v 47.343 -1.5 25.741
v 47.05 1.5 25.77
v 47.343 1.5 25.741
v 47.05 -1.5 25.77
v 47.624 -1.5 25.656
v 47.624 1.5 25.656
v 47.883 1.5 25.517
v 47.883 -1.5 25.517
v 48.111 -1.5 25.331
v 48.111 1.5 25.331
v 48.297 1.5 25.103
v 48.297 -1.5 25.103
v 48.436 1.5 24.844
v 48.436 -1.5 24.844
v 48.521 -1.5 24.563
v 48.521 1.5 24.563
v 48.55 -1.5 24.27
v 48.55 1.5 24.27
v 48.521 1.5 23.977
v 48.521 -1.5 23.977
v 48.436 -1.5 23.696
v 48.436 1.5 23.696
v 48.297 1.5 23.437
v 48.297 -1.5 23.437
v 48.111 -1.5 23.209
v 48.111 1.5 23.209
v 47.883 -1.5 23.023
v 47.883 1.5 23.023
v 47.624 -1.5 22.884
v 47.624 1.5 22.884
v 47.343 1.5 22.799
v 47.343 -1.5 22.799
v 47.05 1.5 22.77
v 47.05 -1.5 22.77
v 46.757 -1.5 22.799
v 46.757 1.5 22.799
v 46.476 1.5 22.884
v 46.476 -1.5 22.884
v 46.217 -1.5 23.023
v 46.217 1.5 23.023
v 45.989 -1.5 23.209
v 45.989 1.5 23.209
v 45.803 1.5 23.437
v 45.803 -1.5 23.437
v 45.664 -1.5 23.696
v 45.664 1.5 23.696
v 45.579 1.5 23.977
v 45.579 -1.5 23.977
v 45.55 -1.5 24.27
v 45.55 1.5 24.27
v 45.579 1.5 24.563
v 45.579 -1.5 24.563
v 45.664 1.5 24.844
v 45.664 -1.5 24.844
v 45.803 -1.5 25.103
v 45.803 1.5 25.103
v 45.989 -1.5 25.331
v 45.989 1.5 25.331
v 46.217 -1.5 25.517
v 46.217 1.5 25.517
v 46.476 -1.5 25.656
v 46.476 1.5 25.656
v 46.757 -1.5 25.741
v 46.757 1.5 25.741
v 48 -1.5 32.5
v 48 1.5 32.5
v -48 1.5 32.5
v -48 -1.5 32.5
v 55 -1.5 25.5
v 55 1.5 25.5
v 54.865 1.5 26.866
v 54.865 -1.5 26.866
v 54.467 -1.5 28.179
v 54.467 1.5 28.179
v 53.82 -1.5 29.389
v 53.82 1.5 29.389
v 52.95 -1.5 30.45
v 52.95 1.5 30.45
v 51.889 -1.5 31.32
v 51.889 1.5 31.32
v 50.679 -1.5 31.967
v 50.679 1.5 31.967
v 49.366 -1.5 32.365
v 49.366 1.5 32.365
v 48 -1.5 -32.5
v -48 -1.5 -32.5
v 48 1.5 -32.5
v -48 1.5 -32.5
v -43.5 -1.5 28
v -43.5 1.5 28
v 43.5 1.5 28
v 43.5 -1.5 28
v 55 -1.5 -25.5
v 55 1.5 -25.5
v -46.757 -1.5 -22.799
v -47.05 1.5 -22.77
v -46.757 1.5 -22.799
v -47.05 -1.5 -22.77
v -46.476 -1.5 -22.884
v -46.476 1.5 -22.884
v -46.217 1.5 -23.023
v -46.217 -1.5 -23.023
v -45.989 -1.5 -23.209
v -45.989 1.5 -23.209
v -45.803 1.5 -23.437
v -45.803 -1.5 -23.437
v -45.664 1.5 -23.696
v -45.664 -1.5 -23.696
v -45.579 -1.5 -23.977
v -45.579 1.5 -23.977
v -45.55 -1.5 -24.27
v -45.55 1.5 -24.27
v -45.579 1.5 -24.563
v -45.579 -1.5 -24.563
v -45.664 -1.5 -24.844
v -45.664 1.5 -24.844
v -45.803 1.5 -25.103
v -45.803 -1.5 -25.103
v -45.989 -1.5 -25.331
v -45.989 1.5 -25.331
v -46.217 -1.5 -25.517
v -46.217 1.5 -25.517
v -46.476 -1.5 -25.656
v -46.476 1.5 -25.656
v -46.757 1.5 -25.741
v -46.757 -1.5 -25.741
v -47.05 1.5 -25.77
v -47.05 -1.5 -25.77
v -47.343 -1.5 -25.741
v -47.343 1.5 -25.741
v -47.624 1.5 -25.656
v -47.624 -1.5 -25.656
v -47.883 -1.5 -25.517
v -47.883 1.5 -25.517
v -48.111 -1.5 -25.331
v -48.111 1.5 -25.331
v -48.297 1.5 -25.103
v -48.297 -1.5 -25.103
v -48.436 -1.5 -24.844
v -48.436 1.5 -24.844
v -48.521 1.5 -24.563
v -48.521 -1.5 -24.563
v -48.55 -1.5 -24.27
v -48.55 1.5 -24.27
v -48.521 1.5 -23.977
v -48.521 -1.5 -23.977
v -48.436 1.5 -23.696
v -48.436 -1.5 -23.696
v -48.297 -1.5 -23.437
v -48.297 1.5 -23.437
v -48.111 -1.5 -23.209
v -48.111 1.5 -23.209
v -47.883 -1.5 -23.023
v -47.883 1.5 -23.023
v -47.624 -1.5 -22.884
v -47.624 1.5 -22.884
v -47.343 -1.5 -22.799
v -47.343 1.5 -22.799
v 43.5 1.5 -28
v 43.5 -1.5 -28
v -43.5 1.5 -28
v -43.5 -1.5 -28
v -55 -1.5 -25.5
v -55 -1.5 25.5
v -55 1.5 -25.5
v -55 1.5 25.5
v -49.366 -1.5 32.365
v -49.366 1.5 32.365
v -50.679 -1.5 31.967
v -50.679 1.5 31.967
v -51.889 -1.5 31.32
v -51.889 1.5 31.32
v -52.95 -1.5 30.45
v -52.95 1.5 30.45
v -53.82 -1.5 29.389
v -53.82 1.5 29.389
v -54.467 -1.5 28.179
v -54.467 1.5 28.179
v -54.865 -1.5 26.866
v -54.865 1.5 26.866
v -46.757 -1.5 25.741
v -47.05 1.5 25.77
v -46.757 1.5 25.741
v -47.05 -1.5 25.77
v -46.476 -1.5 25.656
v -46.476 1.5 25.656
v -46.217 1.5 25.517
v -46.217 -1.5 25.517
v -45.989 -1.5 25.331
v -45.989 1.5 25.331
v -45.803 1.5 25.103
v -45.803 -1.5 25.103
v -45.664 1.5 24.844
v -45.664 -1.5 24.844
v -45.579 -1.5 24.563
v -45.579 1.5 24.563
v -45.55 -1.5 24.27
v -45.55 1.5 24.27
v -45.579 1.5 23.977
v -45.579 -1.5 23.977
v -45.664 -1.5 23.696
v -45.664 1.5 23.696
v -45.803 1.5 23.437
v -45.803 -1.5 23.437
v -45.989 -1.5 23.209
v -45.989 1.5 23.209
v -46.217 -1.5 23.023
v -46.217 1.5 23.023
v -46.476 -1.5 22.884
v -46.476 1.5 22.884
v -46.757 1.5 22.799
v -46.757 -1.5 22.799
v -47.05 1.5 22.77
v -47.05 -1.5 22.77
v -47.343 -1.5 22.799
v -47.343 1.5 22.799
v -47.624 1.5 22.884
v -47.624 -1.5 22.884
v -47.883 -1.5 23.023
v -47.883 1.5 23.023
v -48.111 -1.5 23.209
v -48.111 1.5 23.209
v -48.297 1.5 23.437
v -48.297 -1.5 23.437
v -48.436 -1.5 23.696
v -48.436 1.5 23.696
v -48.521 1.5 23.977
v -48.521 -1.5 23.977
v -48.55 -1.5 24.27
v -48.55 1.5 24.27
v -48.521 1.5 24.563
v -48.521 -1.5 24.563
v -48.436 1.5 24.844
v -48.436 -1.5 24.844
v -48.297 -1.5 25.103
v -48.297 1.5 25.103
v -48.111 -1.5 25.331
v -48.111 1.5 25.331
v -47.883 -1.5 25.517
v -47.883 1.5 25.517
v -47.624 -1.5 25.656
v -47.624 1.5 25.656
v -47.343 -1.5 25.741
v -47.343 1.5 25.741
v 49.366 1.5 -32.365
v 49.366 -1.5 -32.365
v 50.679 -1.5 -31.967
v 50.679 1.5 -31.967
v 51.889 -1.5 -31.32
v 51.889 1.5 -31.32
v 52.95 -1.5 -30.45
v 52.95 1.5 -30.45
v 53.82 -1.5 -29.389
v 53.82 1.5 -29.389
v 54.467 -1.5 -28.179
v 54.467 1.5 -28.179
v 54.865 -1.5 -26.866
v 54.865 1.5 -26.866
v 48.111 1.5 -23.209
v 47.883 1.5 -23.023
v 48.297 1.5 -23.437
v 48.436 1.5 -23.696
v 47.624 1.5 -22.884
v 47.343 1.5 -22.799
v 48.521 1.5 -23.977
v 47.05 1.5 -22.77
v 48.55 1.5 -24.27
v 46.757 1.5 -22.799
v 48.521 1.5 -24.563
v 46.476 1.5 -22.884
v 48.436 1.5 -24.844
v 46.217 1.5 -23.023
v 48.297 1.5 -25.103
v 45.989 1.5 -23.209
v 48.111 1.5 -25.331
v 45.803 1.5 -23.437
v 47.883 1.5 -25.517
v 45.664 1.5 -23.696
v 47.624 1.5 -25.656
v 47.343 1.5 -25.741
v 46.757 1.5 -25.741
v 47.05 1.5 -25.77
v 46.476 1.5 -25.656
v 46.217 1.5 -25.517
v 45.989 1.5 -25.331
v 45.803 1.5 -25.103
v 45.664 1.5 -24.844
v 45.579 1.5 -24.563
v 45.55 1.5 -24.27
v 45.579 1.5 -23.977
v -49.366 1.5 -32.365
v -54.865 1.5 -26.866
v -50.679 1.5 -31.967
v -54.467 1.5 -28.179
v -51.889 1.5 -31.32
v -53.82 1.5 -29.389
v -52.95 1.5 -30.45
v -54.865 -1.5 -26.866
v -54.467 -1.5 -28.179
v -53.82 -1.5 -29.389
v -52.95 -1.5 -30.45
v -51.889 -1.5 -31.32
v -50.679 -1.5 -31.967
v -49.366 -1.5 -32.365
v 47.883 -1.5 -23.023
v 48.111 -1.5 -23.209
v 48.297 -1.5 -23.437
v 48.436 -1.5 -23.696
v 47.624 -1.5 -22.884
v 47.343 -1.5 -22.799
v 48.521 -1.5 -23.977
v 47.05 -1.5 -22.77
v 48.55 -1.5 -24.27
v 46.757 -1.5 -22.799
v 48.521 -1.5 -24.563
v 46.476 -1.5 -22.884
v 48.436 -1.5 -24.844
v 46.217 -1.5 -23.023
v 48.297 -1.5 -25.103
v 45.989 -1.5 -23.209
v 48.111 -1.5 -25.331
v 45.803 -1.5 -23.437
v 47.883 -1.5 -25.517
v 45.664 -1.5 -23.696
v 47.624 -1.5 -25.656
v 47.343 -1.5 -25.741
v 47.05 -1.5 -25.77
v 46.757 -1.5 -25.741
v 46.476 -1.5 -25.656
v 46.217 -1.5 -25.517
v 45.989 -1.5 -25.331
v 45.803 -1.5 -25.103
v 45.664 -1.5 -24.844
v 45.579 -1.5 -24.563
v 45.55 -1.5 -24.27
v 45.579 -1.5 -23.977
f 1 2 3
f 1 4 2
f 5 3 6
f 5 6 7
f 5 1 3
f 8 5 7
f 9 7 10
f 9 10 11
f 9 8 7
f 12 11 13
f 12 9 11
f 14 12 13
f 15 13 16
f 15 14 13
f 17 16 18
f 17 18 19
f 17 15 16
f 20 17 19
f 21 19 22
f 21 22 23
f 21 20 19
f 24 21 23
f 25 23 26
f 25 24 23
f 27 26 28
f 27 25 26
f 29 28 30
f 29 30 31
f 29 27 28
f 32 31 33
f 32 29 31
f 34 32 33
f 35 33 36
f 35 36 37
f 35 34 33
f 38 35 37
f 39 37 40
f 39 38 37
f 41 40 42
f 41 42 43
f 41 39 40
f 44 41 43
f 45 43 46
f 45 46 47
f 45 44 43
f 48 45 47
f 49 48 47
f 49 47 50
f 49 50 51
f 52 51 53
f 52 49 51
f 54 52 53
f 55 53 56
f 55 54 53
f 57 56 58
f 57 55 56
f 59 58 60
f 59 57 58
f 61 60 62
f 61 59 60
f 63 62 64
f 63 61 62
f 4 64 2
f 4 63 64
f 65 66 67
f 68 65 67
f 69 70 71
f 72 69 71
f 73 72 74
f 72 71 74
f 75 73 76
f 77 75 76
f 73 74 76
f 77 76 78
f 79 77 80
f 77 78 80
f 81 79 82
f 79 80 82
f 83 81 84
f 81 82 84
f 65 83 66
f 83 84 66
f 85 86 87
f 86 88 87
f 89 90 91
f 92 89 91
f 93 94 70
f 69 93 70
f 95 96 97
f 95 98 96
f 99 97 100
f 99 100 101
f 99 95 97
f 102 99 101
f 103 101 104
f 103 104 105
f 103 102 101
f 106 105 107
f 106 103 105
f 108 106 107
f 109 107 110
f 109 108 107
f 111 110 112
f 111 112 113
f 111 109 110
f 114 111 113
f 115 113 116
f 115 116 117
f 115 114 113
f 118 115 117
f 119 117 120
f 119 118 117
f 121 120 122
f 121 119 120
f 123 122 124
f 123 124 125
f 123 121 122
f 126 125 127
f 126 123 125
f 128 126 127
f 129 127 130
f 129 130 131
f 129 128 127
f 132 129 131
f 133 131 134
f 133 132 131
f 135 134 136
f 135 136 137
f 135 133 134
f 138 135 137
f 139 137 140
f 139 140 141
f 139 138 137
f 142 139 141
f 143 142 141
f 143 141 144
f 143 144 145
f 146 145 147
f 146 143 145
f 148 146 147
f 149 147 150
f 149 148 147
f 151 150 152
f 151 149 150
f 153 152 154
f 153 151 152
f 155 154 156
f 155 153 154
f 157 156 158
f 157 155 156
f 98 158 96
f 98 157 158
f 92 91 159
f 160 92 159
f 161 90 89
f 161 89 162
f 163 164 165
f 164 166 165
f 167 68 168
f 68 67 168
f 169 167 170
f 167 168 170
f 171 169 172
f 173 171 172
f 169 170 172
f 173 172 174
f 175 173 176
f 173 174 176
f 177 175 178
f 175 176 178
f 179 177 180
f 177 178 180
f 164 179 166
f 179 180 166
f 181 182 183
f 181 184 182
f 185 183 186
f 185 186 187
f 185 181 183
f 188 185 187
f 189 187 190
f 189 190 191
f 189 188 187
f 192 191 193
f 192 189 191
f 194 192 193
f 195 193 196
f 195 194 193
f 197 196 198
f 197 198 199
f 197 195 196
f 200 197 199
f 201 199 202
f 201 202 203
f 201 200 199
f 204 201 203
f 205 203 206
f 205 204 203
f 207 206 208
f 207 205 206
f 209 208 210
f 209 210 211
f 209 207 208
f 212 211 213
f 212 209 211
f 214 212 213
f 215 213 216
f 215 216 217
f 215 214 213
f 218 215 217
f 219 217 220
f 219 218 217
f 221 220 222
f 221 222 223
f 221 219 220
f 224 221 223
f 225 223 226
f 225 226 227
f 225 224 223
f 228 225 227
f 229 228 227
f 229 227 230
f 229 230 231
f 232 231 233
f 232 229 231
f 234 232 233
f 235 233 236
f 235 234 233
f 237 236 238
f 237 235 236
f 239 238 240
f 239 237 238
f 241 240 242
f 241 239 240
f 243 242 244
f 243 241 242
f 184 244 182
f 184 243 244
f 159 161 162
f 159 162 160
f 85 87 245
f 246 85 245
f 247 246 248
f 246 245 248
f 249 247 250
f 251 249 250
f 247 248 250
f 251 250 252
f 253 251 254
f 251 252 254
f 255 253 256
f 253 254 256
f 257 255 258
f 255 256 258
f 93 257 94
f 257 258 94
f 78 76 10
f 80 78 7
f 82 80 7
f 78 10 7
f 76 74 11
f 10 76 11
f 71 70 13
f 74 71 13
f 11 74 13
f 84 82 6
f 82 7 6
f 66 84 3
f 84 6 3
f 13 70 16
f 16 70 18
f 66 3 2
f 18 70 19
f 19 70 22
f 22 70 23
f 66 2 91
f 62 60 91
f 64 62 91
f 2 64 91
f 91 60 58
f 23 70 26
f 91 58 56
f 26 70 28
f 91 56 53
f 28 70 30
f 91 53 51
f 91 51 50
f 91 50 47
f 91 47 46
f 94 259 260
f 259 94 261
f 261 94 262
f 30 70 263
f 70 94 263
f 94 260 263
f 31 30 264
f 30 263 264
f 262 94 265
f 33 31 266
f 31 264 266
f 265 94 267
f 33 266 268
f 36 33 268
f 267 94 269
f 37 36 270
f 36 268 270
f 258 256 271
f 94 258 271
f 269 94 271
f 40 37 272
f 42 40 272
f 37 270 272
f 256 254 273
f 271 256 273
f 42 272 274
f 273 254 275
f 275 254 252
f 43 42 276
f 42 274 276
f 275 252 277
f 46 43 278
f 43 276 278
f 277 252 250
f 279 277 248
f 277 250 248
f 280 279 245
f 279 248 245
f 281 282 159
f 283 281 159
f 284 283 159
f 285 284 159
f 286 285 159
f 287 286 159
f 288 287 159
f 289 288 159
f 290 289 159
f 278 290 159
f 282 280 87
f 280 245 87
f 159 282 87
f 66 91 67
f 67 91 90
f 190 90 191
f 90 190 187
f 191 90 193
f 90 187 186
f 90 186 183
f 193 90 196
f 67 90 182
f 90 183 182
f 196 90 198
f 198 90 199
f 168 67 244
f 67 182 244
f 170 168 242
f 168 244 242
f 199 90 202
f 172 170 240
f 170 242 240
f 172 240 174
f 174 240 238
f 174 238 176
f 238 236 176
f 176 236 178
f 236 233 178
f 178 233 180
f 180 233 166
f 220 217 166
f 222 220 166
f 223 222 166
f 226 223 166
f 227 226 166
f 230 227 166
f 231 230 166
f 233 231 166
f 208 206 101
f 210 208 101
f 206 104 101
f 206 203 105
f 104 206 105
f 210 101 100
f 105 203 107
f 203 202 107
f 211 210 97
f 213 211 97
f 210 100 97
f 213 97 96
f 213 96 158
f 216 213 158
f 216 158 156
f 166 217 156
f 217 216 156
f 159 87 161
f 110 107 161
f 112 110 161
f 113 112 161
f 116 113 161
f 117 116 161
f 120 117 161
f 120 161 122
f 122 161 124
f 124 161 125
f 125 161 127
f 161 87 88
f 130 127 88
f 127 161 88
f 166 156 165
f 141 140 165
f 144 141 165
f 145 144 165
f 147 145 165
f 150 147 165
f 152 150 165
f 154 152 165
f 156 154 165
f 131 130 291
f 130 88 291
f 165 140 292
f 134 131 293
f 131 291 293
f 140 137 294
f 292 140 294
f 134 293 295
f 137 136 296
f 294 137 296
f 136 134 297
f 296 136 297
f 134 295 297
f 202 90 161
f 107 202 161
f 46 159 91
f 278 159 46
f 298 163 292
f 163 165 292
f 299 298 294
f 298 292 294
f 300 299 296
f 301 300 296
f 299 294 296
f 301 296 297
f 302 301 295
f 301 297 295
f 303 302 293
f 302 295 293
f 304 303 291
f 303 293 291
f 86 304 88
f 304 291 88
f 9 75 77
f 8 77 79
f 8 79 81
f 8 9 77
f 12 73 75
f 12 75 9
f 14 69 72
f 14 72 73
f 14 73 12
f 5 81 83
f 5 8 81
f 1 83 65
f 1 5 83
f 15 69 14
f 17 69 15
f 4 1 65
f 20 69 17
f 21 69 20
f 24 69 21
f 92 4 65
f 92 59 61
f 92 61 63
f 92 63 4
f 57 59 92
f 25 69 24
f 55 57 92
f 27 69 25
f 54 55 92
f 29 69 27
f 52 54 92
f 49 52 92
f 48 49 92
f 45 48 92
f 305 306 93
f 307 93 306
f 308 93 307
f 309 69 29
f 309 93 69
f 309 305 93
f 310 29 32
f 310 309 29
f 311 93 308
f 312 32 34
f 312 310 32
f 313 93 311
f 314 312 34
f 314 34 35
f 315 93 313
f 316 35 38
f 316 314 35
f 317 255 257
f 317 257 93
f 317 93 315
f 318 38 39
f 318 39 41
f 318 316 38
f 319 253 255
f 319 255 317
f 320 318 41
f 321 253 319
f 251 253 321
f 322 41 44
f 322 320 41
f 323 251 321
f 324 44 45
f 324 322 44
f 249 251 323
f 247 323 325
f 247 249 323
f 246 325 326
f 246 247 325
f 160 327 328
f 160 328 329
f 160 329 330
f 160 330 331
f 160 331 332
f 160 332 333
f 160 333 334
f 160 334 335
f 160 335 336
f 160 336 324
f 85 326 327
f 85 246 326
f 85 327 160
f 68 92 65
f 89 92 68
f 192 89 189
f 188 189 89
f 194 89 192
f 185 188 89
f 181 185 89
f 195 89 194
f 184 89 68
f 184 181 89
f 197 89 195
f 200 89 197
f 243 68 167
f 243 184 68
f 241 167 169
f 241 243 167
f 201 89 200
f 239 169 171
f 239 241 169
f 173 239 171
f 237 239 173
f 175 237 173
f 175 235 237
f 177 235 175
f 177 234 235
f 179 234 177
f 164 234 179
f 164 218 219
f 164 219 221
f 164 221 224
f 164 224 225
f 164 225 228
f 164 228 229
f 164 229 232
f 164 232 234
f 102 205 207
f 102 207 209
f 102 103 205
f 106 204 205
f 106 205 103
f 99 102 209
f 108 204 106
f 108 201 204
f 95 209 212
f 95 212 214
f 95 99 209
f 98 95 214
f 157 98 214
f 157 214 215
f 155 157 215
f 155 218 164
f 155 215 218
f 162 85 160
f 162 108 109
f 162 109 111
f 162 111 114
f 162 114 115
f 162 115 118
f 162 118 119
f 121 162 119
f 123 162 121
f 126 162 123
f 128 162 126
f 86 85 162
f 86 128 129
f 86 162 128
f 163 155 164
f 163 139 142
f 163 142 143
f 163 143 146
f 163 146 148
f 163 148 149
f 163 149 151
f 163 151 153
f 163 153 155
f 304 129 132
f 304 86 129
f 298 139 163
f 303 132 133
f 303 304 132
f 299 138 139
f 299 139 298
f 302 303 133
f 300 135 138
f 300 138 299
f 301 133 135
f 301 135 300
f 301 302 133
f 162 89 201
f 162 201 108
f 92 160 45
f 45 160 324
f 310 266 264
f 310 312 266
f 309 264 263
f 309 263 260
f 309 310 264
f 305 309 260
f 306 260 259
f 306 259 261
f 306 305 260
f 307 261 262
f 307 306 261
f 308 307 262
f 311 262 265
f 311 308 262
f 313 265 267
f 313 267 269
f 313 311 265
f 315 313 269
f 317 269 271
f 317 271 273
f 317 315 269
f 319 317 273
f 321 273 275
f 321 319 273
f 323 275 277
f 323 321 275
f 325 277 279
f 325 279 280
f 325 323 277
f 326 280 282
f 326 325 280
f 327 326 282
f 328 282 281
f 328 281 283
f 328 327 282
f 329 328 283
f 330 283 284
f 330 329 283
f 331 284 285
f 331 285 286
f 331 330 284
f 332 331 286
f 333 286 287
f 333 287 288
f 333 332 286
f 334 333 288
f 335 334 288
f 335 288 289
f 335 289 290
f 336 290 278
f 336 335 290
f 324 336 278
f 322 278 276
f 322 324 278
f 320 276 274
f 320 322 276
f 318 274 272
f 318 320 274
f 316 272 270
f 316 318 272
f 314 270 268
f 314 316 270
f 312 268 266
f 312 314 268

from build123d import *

# Parameters (mm, degrees)
SKETCH1_R           = 1.5
BOSS_EXTRUDE1_DEPTH = 1.5
CUT_EXTRUDE1_REACH  = 65.955
SKETCH2_W           = 87
SKETCH2_H           = 56


with BuildPart() as part:
    # Sketch1 → Boss-Extrude1 (new, symmetric)
    with BuildSketch(Plane(origin=(0, 0, 0), x_dir=(1, 0, 0), z_dir=(0, 1, 0))):
        with BuildLine():
            Line((48, -32.5), (-48, -32.5))
            ThreePointArc((-48, -32.5), (-52.949747468, -30.449747468), (-55, -25.5))
            Line((-55, -25.5), (-55, 25.5))
            ThreePointArc((-55, 25.5), (-52.949747468, 30.449747468), (-48, 32.5))
            Line((-48, 32.5), (48, 32.5))
            ThreePointArc((48, 32.5), (52.949747468, 30.449747468), (55, 25.5))
            Line((55, 25.5), (55, -25.5))
            ThreePointArc((55, -25.5), (52.949747468, -30.449747468), (48, -32.5))
        make_face()
        with Locations(Location((-47.05, 24.27, 0), (0, 0, 270))):
            Circle(SKETCH1_R, mode=Mode.SUBTRACT)
        with Locations(Location((-47.05, -24.27, 0), (0, 0, 270))):
            Circle(SKETCH1_R, mode=Mode.SUBTRACT)
        with Locations(Location((47.05, -24.27, 0), (0, 0, 270))):
            Circle(SKETCH1_R, mode=Mode.SUBTRACT)
        with Locations(Location((47.05, 24.27, 0), (0, 0, 270))):
            Circle(SKETCH1_R, mode=Mode.SUBTRACT)
    extrude(amount=BOSS_EXTRUDE1_DEPTH, both=True)

    # Sketch2 → Cut-Extrude1 (cut, up to next)
    with BuildSketch(Plane(origin=(0, 1.5, 0), x_dir=(1, 0, 0), z_dir=(0, 1, 0)), mode=Mode.PRIVATE) as cut_extrude1_sk1:
        Rectangle(SKETCH2_W, SKETCH2_H)
    cut_extrude1_tool1 = extrude(cut_extrude1_sk1.sketch, amount=-CUT_EXTRUDE1_REACH, mode=Mode.PRIVATE) & part.part
    add(cut_extrude1_tool1.solids().sort_by_distance((0, 1.5, 0))[0], mode=Mode.SUBTRACT)


solid = part.part
